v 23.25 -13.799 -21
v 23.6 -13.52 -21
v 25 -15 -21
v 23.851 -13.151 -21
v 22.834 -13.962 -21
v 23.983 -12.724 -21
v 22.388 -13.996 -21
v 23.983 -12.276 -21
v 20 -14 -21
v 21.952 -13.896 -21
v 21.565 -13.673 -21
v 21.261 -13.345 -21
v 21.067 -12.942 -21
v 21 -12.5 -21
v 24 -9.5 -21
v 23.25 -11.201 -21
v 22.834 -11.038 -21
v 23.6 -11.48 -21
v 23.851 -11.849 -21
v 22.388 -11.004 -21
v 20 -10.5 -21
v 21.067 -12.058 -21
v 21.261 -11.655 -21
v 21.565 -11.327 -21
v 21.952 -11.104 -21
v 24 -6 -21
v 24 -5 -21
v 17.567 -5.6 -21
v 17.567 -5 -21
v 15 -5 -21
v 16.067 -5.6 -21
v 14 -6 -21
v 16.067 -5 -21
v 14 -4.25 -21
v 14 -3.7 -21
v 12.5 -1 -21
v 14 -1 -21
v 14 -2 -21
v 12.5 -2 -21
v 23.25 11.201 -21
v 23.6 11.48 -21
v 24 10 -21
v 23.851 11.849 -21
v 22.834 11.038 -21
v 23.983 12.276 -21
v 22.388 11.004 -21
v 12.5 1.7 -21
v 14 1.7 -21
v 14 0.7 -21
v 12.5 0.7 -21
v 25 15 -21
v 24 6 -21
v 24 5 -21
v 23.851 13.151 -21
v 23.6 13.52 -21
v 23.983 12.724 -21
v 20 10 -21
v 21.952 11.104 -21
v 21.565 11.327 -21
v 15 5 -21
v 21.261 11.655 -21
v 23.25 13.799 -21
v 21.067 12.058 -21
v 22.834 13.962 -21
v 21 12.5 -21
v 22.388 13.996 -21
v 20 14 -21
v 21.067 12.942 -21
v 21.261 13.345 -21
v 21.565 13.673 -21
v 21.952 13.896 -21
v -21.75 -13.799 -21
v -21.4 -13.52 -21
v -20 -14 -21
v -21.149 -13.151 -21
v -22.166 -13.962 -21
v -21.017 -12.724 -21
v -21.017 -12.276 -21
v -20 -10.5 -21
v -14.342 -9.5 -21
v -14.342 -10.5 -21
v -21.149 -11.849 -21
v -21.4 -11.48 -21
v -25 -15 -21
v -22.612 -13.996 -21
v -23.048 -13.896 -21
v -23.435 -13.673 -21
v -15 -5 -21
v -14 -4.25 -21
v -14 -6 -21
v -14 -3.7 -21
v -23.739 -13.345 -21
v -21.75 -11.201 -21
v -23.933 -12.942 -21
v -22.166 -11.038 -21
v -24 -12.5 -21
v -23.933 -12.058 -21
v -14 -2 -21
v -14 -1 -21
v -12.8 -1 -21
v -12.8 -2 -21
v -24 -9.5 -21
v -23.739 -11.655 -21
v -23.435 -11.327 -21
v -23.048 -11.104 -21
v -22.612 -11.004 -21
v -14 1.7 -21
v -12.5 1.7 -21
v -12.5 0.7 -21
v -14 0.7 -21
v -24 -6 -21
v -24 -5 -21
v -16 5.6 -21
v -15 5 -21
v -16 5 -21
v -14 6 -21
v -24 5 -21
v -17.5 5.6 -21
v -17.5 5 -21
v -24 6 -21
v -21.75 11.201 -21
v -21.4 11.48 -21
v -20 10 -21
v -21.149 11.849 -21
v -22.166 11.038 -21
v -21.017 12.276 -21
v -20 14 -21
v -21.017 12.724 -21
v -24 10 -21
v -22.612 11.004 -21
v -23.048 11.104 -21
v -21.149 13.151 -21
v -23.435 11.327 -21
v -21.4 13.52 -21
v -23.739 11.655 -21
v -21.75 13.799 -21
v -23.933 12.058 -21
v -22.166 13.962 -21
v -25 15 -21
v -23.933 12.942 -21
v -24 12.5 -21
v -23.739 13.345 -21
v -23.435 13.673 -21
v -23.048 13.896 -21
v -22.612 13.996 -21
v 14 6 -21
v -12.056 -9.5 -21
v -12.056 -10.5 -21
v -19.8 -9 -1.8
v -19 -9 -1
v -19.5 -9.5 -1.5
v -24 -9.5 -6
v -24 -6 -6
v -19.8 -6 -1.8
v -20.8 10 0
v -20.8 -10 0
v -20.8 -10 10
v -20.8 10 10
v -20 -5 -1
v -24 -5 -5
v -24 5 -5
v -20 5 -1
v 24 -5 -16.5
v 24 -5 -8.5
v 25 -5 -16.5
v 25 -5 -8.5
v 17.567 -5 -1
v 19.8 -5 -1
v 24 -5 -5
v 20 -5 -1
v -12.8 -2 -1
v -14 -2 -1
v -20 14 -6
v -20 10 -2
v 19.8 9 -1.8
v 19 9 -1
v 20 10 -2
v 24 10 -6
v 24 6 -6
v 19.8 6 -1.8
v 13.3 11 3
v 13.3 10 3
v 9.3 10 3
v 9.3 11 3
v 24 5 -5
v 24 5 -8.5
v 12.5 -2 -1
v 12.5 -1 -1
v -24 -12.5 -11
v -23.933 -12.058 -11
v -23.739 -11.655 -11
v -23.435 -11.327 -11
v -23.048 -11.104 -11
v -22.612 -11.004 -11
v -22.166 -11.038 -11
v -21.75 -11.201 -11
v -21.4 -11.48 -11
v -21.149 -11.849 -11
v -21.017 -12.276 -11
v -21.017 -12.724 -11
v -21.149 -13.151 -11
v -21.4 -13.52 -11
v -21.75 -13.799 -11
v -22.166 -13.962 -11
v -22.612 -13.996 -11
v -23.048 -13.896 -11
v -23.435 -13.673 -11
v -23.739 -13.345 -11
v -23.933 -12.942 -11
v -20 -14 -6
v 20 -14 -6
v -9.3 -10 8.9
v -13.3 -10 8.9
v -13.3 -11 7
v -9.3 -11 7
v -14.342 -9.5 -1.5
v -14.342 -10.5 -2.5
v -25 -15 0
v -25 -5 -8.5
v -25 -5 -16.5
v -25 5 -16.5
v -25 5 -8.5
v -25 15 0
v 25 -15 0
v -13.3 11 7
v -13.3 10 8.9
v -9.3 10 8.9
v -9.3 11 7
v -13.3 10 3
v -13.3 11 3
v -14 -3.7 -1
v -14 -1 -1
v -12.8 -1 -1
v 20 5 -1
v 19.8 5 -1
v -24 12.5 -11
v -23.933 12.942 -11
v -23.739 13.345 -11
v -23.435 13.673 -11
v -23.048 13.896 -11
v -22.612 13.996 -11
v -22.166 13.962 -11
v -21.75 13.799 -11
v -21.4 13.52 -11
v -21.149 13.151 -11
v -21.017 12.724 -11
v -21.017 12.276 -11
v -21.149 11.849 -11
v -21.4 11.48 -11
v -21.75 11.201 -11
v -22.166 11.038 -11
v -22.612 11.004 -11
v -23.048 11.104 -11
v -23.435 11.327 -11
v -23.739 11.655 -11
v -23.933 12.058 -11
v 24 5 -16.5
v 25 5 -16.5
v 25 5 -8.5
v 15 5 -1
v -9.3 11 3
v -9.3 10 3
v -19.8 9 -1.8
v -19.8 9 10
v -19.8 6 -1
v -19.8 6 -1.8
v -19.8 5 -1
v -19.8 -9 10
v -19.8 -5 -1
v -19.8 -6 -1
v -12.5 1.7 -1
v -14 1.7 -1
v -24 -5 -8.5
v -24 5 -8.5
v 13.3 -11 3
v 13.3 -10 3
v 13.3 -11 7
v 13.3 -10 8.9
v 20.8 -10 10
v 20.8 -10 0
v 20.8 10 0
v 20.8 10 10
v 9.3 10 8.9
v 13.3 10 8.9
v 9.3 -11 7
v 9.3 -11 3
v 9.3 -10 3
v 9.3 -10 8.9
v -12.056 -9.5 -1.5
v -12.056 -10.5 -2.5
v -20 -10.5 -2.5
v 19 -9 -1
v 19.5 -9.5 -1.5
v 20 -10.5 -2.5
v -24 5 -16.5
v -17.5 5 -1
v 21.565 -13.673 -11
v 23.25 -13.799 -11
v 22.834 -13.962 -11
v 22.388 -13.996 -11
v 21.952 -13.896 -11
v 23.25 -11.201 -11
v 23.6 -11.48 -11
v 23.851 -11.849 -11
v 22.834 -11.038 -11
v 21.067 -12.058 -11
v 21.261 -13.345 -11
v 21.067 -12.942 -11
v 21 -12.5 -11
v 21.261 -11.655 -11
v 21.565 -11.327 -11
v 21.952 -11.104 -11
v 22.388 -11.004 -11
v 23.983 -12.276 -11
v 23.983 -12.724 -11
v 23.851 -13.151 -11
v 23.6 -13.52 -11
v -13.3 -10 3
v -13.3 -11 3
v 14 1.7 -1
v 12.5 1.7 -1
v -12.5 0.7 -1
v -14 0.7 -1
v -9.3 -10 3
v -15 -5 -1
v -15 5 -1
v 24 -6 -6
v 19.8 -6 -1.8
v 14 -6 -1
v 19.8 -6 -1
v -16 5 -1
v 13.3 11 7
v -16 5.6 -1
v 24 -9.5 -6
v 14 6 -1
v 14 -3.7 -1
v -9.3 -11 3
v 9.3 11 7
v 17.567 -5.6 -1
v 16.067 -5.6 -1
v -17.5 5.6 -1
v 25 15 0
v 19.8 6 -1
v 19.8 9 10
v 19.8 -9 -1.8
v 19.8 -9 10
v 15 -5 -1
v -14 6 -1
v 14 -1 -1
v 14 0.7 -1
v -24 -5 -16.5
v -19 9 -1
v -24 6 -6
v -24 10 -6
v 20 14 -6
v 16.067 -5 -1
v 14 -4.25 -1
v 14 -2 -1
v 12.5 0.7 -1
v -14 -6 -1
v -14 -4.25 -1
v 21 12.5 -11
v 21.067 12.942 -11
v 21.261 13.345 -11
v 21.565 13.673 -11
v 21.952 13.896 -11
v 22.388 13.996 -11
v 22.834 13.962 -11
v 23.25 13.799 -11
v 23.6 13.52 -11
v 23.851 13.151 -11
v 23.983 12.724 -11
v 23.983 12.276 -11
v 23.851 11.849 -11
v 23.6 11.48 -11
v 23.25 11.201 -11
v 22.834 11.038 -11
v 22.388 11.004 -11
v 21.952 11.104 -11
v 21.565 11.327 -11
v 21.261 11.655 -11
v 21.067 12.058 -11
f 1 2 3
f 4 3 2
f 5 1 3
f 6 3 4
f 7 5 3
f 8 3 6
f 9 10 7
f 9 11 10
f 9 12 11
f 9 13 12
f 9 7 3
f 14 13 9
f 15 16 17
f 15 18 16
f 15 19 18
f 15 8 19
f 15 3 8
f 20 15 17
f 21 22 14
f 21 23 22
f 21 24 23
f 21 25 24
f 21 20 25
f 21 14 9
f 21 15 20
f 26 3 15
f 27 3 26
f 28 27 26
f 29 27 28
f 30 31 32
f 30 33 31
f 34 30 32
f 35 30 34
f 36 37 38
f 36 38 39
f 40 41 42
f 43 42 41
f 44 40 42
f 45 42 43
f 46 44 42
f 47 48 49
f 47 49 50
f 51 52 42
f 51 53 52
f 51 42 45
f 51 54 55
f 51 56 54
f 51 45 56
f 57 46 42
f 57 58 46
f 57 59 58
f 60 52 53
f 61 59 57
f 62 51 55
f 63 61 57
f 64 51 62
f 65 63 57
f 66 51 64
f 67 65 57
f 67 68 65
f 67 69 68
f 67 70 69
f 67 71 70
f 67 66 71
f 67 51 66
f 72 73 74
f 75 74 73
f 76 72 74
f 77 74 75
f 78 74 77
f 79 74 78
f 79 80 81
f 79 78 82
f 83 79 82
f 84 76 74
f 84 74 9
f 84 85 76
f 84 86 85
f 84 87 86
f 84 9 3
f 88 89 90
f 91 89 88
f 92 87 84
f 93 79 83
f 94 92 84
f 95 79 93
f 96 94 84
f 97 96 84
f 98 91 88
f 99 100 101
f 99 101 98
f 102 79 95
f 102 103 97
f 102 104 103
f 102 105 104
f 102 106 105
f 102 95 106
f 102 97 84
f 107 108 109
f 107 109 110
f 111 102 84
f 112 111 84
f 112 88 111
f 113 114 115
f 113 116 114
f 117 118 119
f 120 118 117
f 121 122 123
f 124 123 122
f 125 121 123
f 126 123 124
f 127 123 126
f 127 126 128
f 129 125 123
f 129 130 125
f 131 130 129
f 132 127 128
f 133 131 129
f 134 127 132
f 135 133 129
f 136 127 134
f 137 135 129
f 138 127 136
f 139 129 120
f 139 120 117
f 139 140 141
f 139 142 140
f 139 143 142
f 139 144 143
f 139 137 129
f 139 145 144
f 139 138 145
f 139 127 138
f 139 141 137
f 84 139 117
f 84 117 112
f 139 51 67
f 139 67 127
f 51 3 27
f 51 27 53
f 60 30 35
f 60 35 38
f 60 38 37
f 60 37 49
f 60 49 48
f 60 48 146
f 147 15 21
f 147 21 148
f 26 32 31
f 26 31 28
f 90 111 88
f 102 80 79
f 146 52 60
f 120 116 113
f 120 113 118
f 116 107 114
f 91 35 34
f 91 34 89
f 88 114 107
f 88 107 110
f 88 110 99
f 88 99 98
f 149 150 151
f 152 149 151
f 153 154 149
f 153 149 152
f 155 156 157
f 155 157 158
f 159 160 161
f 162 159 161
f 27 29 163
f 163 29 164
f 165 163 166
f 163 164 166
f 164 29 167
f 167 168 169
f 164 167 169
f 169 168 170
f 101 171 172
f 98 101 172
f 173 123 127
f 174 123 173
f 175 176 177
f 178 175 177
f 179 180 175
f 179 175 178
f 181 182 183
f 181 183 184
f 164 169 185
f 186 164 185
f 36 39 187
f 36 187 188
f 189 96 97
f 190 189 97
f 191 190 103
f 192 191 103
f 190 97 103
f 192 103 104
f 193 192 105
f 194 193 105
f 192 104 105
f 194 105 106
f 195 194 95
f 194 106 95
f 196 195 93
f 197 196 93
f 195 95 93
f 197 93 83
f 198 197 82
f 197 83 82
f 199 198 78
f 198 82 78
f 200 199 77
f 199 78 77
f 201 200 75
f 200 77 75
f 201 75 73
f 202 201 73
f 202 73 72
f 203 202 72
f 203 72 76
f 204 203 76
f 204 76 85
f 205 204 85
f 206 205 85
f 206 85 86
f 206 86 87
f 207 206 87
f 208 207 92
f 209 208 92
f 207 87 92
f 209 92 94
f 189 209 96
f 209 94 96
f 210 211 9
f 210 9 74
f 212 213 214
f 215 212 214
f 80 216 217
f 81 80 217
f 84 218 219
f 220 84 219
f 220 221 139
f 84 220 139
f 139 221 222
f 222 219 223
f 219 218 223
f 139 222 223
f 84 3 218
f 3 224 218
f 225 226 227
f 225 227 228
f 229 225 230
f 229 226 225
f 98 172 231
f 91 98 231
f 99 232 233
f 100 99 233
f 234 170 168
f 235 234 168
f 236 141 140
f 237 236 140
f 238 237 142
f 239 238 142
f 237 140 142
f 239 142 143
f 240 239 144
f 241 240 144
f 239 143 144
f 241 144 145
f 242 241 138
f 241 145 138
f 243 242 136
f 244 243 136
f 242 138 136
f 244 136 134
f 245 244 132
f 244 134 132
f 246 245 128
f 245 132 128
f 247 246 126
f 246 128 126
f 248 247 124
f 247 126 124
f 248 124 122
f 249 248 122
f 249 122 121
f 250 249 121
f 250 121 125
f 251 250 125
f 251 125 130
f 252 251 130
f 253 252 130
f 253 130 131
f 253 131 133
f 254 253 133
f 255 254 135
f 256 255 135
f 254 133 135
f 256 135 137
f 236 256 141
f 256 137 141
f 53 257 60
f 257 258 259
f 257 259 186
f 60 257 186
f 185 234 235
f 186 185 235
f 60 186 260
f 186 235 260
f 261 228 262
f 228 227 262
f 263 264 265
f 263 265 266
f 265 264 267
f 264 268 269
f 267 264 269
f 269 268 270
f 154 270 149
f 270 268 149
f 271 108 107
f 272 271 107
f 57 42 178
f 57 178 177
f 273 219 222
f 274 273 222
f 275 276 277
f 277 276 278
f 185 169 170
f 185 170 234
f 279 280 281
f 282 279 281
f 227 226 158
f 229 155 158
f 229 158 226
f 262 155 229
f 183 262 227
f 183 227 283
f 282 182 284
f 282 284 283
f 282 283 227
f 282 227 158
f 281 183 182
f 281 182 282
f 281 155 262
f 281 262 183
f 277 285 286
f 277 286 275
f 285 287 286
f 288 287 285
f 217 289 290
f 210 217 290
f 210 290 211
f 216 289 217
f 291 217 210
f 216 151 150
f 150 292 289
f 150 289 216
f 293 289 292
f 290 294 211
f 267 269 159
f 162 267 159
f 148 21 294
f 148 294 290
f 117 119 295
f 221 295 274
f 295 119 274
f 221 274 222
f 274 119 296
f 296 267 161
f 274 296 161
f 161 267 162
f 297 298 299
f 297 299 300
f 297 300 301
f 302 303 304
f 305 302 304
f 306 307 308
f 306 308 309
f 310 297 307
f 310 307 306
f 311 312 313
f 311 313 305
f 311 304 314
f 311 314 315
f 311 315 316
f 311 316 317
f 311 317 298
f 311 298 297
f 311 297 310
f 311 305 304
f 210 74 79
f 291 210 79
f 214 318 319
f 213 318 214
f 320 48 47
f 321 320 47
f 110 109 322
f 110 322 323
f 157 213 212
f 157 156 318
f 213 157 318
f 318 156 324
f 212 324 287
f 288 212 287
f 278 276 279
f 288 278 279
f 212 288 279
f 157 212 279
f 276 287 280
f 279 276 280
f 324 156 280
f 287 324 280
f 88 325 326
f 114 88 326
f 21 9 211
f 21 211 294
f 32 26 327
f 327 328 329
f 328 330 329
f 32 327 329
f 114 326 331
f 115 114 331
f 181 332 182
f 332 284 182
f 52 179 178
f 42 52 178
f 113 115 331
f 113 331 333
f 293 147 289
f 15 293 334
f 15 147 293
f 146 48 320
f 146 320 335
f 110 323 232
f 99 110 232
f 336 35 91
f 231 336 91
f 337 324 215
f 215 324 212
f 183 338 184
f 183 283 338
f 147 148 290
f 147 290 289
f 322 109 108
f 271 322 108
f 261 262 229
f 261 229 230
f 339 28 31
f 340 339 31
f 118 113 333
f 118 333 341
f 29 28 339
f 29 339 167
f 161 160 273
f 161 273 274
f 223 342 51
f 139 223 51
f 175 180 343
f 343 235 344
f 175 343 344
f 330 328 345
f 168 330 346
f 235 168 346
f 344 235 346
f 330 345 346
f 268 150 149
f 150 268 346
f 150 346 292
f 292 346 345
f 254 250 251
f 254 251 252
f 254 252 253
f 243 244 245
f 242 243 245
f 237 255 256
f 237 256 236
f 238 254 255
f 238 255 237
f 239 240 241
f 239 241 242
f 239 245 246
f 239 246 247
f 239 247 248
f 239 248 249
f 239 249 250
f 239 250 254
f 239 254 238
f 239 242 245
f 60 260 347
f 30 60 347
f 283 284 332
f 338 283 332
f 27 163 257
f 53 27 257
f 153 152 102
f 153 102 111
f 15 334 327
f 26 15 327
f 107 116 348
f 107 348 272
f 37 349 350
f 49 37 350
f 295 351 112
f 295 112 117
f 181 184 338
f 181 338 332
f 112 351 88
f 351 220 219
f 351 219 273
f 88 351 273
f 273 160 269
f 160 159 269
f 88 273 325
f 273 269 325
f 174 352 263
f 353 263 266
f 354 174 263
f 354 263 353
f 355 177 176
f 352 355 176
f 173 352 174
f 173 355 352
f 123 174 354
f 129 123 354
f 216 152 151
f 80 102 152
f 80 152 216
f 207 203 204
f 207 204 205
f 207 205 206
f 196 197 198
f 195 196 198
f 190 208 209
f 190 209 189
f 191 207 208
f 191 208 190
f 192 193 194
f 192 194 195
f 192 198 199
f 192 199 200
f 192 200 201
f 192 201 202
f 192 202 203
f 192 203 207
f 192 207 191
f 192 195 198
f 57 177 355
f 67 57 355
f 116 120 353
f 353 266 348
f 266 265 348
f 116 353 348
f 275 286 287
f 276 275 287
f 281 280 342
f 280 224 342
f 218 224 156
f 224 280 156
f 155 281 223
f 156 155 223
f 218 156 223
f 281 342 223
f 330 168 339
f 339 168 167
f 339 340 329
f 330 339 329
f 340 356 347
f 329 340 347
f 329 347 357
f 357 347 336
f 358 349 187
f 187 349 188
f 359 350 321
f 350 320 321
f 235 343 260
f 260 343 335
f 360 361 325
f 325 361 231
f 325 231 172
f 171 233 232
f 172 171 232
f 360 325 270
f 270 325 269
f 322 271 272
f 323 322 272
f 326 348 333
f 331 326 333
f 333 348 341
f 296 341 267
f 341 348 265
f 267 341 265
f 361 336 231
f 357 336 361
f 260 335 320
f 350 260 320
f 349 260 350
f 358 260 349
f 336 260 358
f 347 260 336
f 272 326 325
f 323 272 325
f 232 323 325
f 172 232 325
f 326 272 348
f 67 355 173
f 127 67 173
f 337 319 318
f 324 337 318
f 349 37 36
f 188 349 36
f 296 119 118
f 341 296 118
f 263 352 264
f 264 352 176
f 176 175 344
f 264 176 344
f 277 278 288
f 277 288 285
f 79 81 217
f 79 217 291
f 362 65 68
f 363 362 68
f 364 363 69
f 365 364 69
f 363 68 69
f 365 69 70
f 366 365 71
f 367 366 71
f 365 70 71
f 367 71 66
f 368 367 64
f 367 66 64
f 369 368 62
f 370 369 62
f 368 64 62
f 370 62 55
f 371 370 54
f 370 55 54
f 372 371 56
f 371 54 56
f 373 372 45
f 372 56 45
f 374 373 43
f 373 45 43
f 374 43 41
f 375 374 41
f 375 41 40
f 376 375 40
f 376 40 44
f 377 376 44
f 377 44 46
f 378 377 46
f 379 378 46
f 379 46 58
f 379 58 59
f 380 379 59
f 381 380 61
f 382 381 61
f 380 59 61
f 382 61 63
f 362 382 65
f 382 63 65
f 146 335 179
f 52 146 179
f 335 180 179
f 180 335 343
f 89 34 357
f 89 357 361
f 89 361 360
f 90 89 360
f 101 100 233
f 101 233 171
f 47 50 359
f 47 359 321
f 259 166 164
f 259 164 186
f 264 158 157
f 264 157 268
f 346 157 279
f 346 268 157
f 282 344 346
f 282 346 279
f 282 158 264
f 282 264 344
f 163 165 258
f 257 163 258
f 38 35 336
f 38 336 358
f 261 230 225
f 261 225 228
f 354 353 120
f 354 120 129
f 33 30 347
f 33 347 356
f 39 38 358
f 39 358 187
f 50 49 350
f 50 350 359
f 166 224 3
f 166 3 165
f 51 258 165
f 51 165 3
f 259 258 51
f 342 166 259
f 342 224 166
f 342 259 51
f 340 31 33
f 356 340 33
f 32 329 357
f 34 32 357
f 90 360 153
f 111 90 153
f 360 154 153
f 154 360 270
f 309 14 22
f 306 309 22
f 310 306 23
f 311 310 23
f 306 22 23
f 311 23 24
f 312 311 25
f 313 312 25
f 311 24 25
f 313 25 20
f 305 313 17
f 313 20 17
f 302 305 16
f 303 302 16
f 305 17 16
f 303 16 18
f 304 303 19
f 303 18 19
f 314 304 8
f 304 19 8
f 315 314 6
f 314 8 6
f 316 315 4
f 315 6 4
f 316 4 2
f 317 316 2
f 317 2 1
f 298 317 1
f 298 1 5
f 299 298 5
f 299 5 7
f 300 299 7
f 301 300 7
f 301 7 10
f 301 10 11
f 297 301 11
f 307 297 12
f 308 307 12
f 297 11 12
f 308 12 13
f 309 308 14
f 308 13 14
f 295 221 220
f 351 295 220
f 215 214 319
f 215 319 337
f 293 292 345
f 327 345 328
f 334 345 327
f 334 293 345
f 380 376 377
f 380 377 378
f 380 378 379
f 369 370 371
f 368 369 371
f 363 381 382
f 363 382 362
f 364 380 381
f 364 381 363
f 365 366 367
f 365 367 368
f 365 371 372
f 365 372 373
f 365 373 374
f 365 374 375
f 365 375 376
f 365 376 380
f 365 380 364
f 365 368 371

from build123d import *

# Parameters (mm, degrees)
SKETCH1_W            = 41.6
SKETCH1_H            = 20
SKETCH1_W_2          = 39.6
SKETCH1_H_2          = 18
BOSS_EXTRUDE2_DEPTH  = 10
SKETCH2_W            = 4
SKETCH2_H            = 10
BOSS_EXTRUDE3_DEPTH  = 1
SKETCH3_W            = 3
SKETCH3_H            = 1
CUT_EXTRUDE1_DEPTH   = 27
SKETCH4_W            = 4
SKETCH4_H            = 10
BOSS_EXTRUDE4_DEPTH  = 1
SKETCH5_W            = 3
SKETCH5_H            = 1
CUT_EXTRUDE2_DEPTH   = 27
SKETCH6_W            = 50
SKETCH6_H            = 30
SKETCH6_W_2          = 41.6
SKETCH6_H_2          = 20
SKETCH6_W_3          = 39.6
SKETCH6_H_3          = 18
BOSS_EXTRUDE6_DEPTH  = 1
SKETCH7_W            = 50
SKETCH7_H            = 30
SKETCH7_W_2          = 48
SKETCH7_H_2          = 28
BOSS_EXTRUDE7_DEPTH  = 20
SKETCH8_W            = 4.2
SKETCH8_H            = 1
BOSS_EXTRUDE8_DEPTH  = 20
SKETCH9_W            = 4.2
SKETCH9_H            = 1
BOSS_EXTRUDE9_DEPTH  = 20
SKETCH10_W           = 4
SKETCH10_H           = 4
BOSS_EXTRUDE10_DEPTH = 20
SKETCH11_W           = 2
SKETCH11_H           = 10
CUT_EXTRUDE3_DEPTH   = 1
SKETCH12_W           = 2
SKETCH12_H           = 10
CUT_EXTRUDE4_DEPTH   = 1
SKETCH13_R           = 1.5
CUT_EXTRUDE5_DEPTH   = 10
CHAMFER2_SIZE        = 5
CHAMFER3_SIZE        = 5
CHAMFER4_SIZE        = 4
SKETCH16_W           = 1.2
SKETCH16_H           = 1
BOSS_EXTRUDE11_DEPTH = 20
BOSS_EXTRUDE12_DEPTH = 20
SKETCH18_W           = 28
SKETCH18_H           = 0.549749779
BOSS_EXTRUDE13_DEPTH = 20
SKETCH19_W           = 1.2
SKETCH19_H           = 1
CUT_EXTRUDE6_DEPTH   = 20
SKETCH20_W           = 1.5
SKETCH20_H           = 1
BOSS_EXTRUDE14_DEPTH = 20
SKETCH22_W           = 0.3
SKETCH22_H           = 1
BOSS_EXTRUDE16_DEPTH = 20
SKETCH24_W           = 1.2
SKETCH24_H           = 1
CUT_EXTRUDE7_DEPTH   = 20
SKETCH25_W           = 1.5
SKETCH25_H           = 1
BOSS_EXTRUDE17_DEPTH = 20
SKETCH26_W           = 1.5
SKETCH26_H           = 0.6
CUT_EXTRUDE8_DEPTH   = 20
SKETCH27_W           = 1.5
SKETCH27_H           = 0.6
CUT_EXTRUDE9_DEPTH   = 20


# Some blends are built 0.0001 mm under size
with BuildPart() as part:
    # Sketch1 → Boss-Extrude2 (new body)
    with BuildSketch(Plane.XY):
        Rectangle(SKETCH1_W, SKETCH1_H)
        Rectangle(SKETCH1_W_2, SKETCH1_H_2, mode=Mode.SUBTRACT)
    extrude(amount=BOSS_EXTRUDE2_DEPTH)

    # Sketch2 → Boss-Extrude3 (add)
    with BuildSketch(Plane.XZ.offset(10)):
        with Locations((-11.3, 5)):
            Rectangle(SKETCH2_W, SKETCH2_H)
        with Locations((11.3, 5)):
            Rectangle(SKETCH2_W, SKETCH2_H)
    extrude(amount=BOSS_EXTRUDE3_DEPTH)

    # Sketch3 → Cut-Extrude1 (cut)
    with BuildSketch(Plane.ZY.offset(13.3)):
        Polygon((8.900149248, -10), (7, -11), (10, -11), (10, -10), align=None)
        with Locations((1.5, -10.5)):
            Rectangle(SKETCH3_W, SKETCH3_H)
    extrude(amount=-CUT_EXTRUDE1_DEPTH, mode=Mode.SUBTRACT)

    # Sketch4 → Boss-Extrude4 (add)
    with BuildSketch(Plane(origin=(0, 10, 0), x_dir=(1, 0, 0), z_dir=(0, 1, 0))):
        with Locations((11.3, -5)):
            Rectangle(SKETCH4_W, SKETCH4_H)
        with Locations((-11.3, -5)):
            Rectangle(SKETCH4_W, SKETCH4_H)
    extrude(amount=BOSS_EXTRUDE4_DEPTH)

    # Sketch5 → Cut-Extrude2 (cut)
    with BuildSketch(Plane(origin=(13.3, 0, 0), x_dir=(0, 0, -1), z_dir=(1, 0, 0))):
        Polygon((-7, 11), (-10, 11), (-10, 10), (-8.900149248, 10), align=None)
        with Locations((-1.5, 10.5)):
            Rectangle(SKETCH5_W, SKETCH5_H)
    extrude(amount=-CUT_EXTRUDE2_DEPTH, mode=Mode.SUBTRACT)

    # Sketch6 → Boss-Extrude6 (add)
    # profile 1 of 2: a face of its own
    with BuildSketch(Plane(origin=(0, 0, 0), x_dir=(-1, 0, 0), z_dir=(0, 0, -1))):
        Rectangle(SKETCH6_W, SKETCH6_H)
        Rectangle(SKETCH6_W_2, SKETCH6_H_2, mode=Mode.SUBTRACT)
    # profile 2 of 2: a face of its own
    with BuildSketch(Plane(origin=(0, 0, 0), x_dir=(-1, 0, 0), z_dir=(0, 0, -1))):
        Rectangle(SKETCH6_W_2, SKETCH6_H_2)
        Rectangle(SKETCH6_W_3, SKETCH6_H_3, mode=Mode.SUBTRACT)
    extrude(amount=BOSS_EXTRUDE6_DEPTH)

    # Sketch7 → Boss-Extrude7 (add)
    with BuildSketch(Plane(origin=(0, 0, -1), x_dir=(-1, 0, 0), z_dir=(0, 0, -1))):
        Rectangle(SKETCH7_W, SKETCH7_H)
        Rectangle(SKETCH7_W_2, SKETCH7_H_2, mode=Mode.SUBTRACT)
    extrude(amount=BOSS_EXTRUDE7_DEPTH)

    # Sketch8 → Boss-Extrude8 (add)
    with BuildSketch(Plane(origin=(0, 0, -1), x_dir=(-1, 0, 0), z_dir=(0, 0, -1))):
        Polygon((-15, -5), (-19.8, -5), (-19.8, -6), (-14, -6), (-14, 6), (-19.8, 6), (-19.8, 5), (-15, 5), align=None)
        with Locations((-21.9, 5.5)):
            Rectangle(SKETCH8_W, SKETCH8_H)
        with Locations((-21.9, -5.5)):
            Rectangle(SKETCH8_W, SKETCH8_H)
    extrude(amount=BOSS_EXTRUDE8_DEPTH)

    # Sketch9 → Boss-Extrude9 (add)
    with BuildSketch(Plane(origin=(0, 0, -1), x_dir=(-1, 0, 0), z_dir=(0, 0, -1))):
        Polygon((15, 5), (19.8, 5), (19.8, 6), (14, 6), (14, -6), (19.8, -6), (19.8, -5), (15, -5), align=None)
        with Locations((21.9, 5.5)):
            Rectangle(SKETCH9_W, SKETCH9_H)
        with Locations((21.9, -5.5)):
            Rectangle(SKETCH9_W, SKETCH9_H)
    extrude(amount=BOSS_EXTRUDE9_DEPTH)

    # Sketch10 → Boss-Extrude10 (add)
    with BuildSketch(Plane(origin=(0, 0, -1), x_dir=(-1, 0, 0), z_dir=(0, 0, -1))):
        with Locations((-22, 12)):
            Rectangle(SKETCH10_W, SKETCH10_H)
        with Locations((22, 12)):
            Rectangle(SKETCH10_W, SKETCH10_H)
        with Locations((22, -12)):
            Rectangle(SKETCH10_W, SKETCH10_H)
        with Locations((-22, -12)):
            Rectangle(SKETCH10_W, SKETCH10_H)
    extrude(amount=BOSS_EXTRUDE10_DEPTH)

    # Sketch11 → Cut-Extrude3 (cut)
    with BuildSketch(Plane.ZY.offset(25)):
        Polygon((-10.5, -5), (-10.5, 5), (-16.5, 5), (-16.5, 0), (-16.5, -5), align=None)
        with Locations((-9.5, 0)):
            Rectangle(SKETCH11_W, SKETCH11_H)
    extrude(amount=-CUT_EXTRUDE3_DEPTH, mode=Mode.SUBTRACT)

    # Sketch12 → Cut-Extrude4 (cut)
    with BuildSketch(Plane(origin=(25, 0, 0), x_dir=(0, 0, -1), z_dir=(1, 0, 0))):
        with Locations((9.5, 0)):
            Rectangle(SKETCH12_W, SKETCH12_H)
        Polygon((16.5, 5), (10.5, 5), (10.5, -5), (16.5, -5), (16.5, 0), align=None)
    extrude(amount=-CUT_EXTRUDE4_DEPTH, mode=Mode.SUBTRACT)

    # Sketch13 → Cut-Extrude5 (cut)
    with BuildSketch(Plane(origin=(0, 0, -21), x_dir=(-1, 0, 0), z_dir=(0, 0, -1))):
        with Locations((-22.5, 12.5)):
            Circle(SKETCH13_R)
        with Locations((22.5, 12.5)):
            Circle(SKETCH13_R)
        with Locations((22.5, -12.5)):
            Circle(SKETCH13_R)
        with Locations((-22.5, -12.5)):
            Circle(SKETCH13_R)
    extrude(amount=-CUT_EXTRUDE5_DEPTH, mode=Mode.SUBTRACT)

    # Chamfer2
    chamfer2_edges = [part.edges().sort_by_distance(p)[0] for p in [
        (0, 14, -1),
        (0, -14, -1),
    ]]
    chamfer(chamfer2_edges, length=CHAMFER2_SIZE - 0.0001)  # a hair under: the kernel refuses the full size

    # Chamfer3
    # the kernel refuses this chamfer: 5 mm, written as the material it adds along each edge
    with BuildSketch(Plane(origin=(24, -21.85851494, -1), x_dir=(-0.9996219169112968, 0, 0.02749587661058636), z_dir=(0, 1, 0))) as chamfer3_piece_1_section:
        Polygon((CHAMFER3_SIZE * 0.999621916911, -CHAMFER3_SIZE * 0.0274958766106), (-CHAMFER3_SIZE * 0.0274958766106, -CHAMFER3_SIZE * 0.999621916911), (0, 0), align=None)
    chamfer3_piece_1 = extrude(amount=28.71692988, mode=Mode.PRIVATE)
    chamfer3_piece_1 = split(chamfer3_piece_1, bisect_by=Plane(origin=(19.8, -10.000025, -1.99995), z_dir=(1, 0, 0)), keep=Keep.TOP, mode=Mode.PRIVATE)
    chamfer3_piece_1 = split(chamfer3_piece_1, bisect_by=Plane(origin=(19.999975, -5, -1.99995), z_dir=(0, -1, 0)), keep=Keep.TOP, mode=Mode.PRIVATE)
    chamfer3_piece_1 = split(chamfer3_piece_1, bisect_by=Plane(origin=(19.999975, -10.0000375, -1.9999375), z_dir=(0, 0.7071067811865476, -0.7071067811865476)), keep=Keep.TOP, mode=Mode.PRIVATE)
    add(chamfer3_piece_1)
    with BuildSketch(Plane(origin=(24, -21.85851494, -1), x_dir=(-0.9996219169112968, 0, 0.02749587661058636), z_dir=(0, 1, 0))) as chamfer3_piece_2_section:
        Polygon((CHAMFER3_SIZE * 0.999621916911, -CHAMFER3_SIZE * 0.0274958766106), (-CHAMFER3_SIZE * 0.0274958766106, -CHAMFER3_SIZE * 0.999621916911), (0, 0), align=None)
    chamfer3_piece_2 = extrude(amount=28.71692988, mode=Mode.PRIVATE)
    chamfer3_piece_2 = split(chamfer3_piece_2, bisect_by=Plane(origin=(19.599975009, -9, -1.399950019), z_dir=(0, -1, 0)), keep=Keep.TOP, mode=Mode.PRIVATE)
    chamfer3_piece_2 = split(chamfer3_piece_2, bisect_by=Plane(origin=(19.599975009, -9.300037514, -1.299937514), z_dir=(0, 0.7071067811865476, -0.7071067811865476)), keep=Keep.TOP, mode=Mode.PRIVATE)
    add(chamfer3_piece_2)
    with BuildSketch(Plane(origin=(24, -21.85851494, -1), x_dir=(-0.9996219169112968, 0, 0.02749587661058636), z_dir=(0, 1, 0))) as chamfer3_piece_3_section:
        Polygon((CHAMFER3_SIZE * 0.999621916911, -CHAMFER3_SIZE * 0.0274958766106), (-CHAMFER3_SIZE * 0.0274958766106, -CHAMFER3_SIZE * 0.999621916911), (0, 0), align=None)
    chamfer3_piece_3 = extrude(amount=28.71692988, mode=Mode.PRIVATE)
    chamfer3_piece_3 = split(chamfer3_piece_3, bisect_by=Plane(origin=(19.8, 6.42920747, -1.451851852), z_dir=(1, 0, 0)), keep=Keep.TOP, mode=Mode.PRIVATE)
    chamfer3_piece_3 = split(chamfer3_piece_3, bisect_by=Plane(origin=(19.903703704, 5, -1.451851852), z_dir=(0, 1, 0)), keep=Keep.TOP, mode=Mode.PRIVATE)
    add(chamfer3_piece_3)
    with BuildSketch(Plane(origin=(-24, 21.85851494, -1), x_dir=(0.9996219169112968, 0, 0.02749587661058636), z_dir=(0, -1, 0))) as chamfer3_piece_4_section:
        Polygon((CHAMFER3_SIZE * 0.999621916911, -CHAMFER3_SIZE * 0.0274958766106), (-CHAMFER3_SIZE * 0.0274958766106, -CHAMFER3_SIZE * 0.999621916911), (0, 0), align=None)
    chamfer3_piece_4 = extrude(amount=28.71692988, mode=Mode.PRIVATE)
    chamfer3_piece_4 = split(chamfer3_piece_4, bisect_by=Plane(origin=(-19.8, 10.000025, -1.99995), z_dir=(-1, 0, 0)), keep=Keep.TOP, mode=Mode.PRIVATE)
    chamfer3_piece_4 = split(chamfer3_piece_4, bisect_by=Plane(origin=(-19.999975, 15, -1.99995), z_dir=(0, -1, 0)), keep=Keep.TOP, mode=Mode.PRIVATE)
    chamfer3_piece_4 = split(chamfer3_piece_4, bisect_by=Plane(origin=(-19.999975, 5, -1.99995), z_dir=(0, 1, 0)), keep=Keep.TOP, mode=Mode.PRIVATE)
    add(chamfer3_piece_4)
    with BuildSketch(Plane(origin=(-24, 21.85851494, -1), x_dir=(0.9996219169112968, 0, 0.02749587661058636), z_dir=(0, -1, 0))) as chamfer3_piece_5_section:
        Polygon((CHAMFER3_SIZE * 0.999621916911, -CHAMFER3_SIZE * 0.0274958766106), (-CHAMFER3_SIZE * 0.0274958766106, -CHAMFER3_SIZE * 0.999621916911), (0, 0), align=None)
    chamfer3_piece_5 = extrude(amount=28.71692988, mode=Mode.PRIVATE)
    chamfer3_piece_5 = split(chamfer3_piece_5, bisect_by=Plane(origin=(-19.599975009, 9, -1.399950019), z_dir=(0, 1, 0)), keep=Keep.TOP, mode=Mode.PRIVATE)
    chamfer3_piece_5 = split(chamfer3_piece_5, bisect_by=Plane(origin=(-19.599975009, 15, -1.399950019), z_dir=(0, -1, 0)), keep=Keep.TOP, mode=Mode.PRIVATE)
    add(chamfer3_piece_5)
    with BuildSketch(Plane(origin=(-24, 21.85851494, -1), x_dir=(0.9996219169112968, 0, 0.02749587661058636), z_dir=(0, -1, 0))) as chamfer3_piece_6_section:
        Polygon((CHAMFER3_SIZE * 0.999621916911, -CHAMFER3_SIZE * 0.0274958766106), (-CHAMFER3_SIZE * 0.0274958766106, -CHAMFER3_SIZE * 0.999621916911), (0, 0), align=None)
    chamfer3_piece_6 = extrude(amount=28.71692988, mode=Mode.PRIVATE)
    chamfer3_piece_6 = split(chamfer3_piece_6, bisect_by=Plane(origin=(-19.8, -6.42920747, -1.451851852), z_dir=(-1, 0, 0)), keep=Keep.TOP, mode=Mode.PRIVATE)
    chamfer3_piece_6 = split(chamfer3_piece_6, bisect_by=Plane(origin=(-19.903703704, -6, -1.451851852), z_dir=(0, -1, 0)), keep=Keep.TOP, mode=Mode.PRIVATE)
    add(chamfer3_piece_6)
    with BuildSketch(Plane(origin=(-24, 6.85841494, -1), x_dir=(0.9996219169112968, 0, 0.02749587661058636), z_dir=(0, -1, 0))) as chamfer3_piece_7_section:
        Polygon((CHAMFER3_SIZE * 0.999621916911, -CHAMFER3_SIZE * 0.0274958766106), (-CHAMFER3_SIZE * 0.0274958766106, -CHAMFER3_SIZE * 0.999621916911), (0, 0), align=None)
    chamfer3_piece_7 = extrude(amount=28.71692988, mode=Mode.PRIVATE)
    chamfer3_piece_7 = split(chamfer3_piece_7, bisect_by=Plane(origin=(-19.8, 6.42920747, -1.451851852), z_dir=(-1, 0, 0)), keep=Keep.TOP, mode=Mode.PRIVATE)
    chamfer3_piece_7 = split(chamfer3_piece_7, bisect_by=Plane(origin=(-19.903703704, 5, -1.451851852), z_dir=(0, 1, 0)), keep=Keep.TOP, mode=Mode.PRIVATE)
    add(chamfer3_piece_7)
    with BuildSketch(Plane(origin=(-24, -6, -1), x_dir=(0.9996219169112968, 0, 0.02749587661058636), z_dir=(0, -1, 0))) as chamfer3_piece_8_section:
        Polygon((CHAMFER3_SIZE * 0.999621916911, -CHAMFER3_SIZE * 0.0274958766106), (-CHAMFER3_SIZE * 0.0274958766106, -CHAMFER3_SIZE * 0.999621916911), (0, 0), align=None)
    chamfer3_piece_8 = extrude(amount=15.85851494, mode=Mode.PRIVATE)
    chamfer3_piece_8 = split(chamfer3_piece_8, bisect_by=Plane(origin=(-19.8, -7.5, -1.451851852), z_dir=(-1, 0, 0)), keep=Keep.TOP, mode=Mode.PRIVATE)
    chamfer3_piece_8 = split(chamfer3_piece_8, bisect_by=Plane(origin=(-19.903703704, -8.475975926, -0.475875926), z_dir=(0, 0.7071067811865476, -0.7071067811865476)), keep=Keep.TOP, mode=Mode.PRIVATE)
    add(chamfer3_piece_8)
    with BuildSketch(Plane(origin=(-24, 6.85841494, -1), x_dir=(0.9996219169112968, 0, 0.02749587661058636), z_dir=(0, -1, 0))) as chamfer3_piece_9_section:
        Polygon((CHAMFER3_SIZE * 0.999621916911, -CHAMFER3_SIZE * 0.0274958766106), (-CHAMFER3_SIZE * 0.0274958766106, -CHAMFER3_SIZE * 0.999621916911), (0, 0), align=None)
    chamfer3_piece_9 = extrude(amount=28.71692988, mode=Mode.PRIVATE)
    chamfer3_piece_9 = split(chamfer3_piece_9, bisect_by=Plane(origin=(-19.599975009, -9, -1.399950019), z_dir=(0, -1, 0)), keep=Keep.TOP, mode=Mode.PRIVATE)
    chamfer3_piece_9 = split(chamfer3_piece_9, bisect_by=Plane(origin=(-19.599975009, -9.300037514, -1.299937514), z_dir=(0, 0.7071067811865476, -0.7071067811865476)), keep=Keep.TOP, mode=Mode.PRIVATE)
    add(chamfer3_piece_9)
    with BuildSketch(Plane(origin=(24, -6.85841494, -1), x_dir=(-0.9996219169112968, 0, 0.02749587661058636), z_dir=(0, 1, 0))) as chamfer3_piece_10_section:
        Polygon((CHAMFER3_SIZE * 0.999621916911, -CHAMFER3_SIZE * 0.0274958766106), (-CHAMFER3_SIZE * 0.0274958766106, -CHAMFER3_SIZE * 0.999621916911), (0, 0), align=None)
    chamfer3_piece_10 = extrude(amount=28.71692988, mode=Mode.PRIVATE)
    chamfer3_piece_10 = split(chamfer3_piece_10, bisect_by=Plane(origin=(19.8, -6.42920747, -1.451851852), z_dir=(1, 0, 0)), keep=Keep.TOP, mode=Mode.PRIVATE)
    chamfer3_piece_10 = split(chamfer3_piece_10, bisect_by=Plane(origin=(19.903703704, -5, -1.451851852), z_dir=(0, -1, 0)), keep=Keep.TOP, mode=Mode.PRIVATE)
    add(chamfer3_piece_10)
    with BuildSketch(Plane(origin=(24, -6.85841494, -1), x_dir=(-0.9996219169112968, 0, 0.02749587661058636), z_dir=(0, 1, 0))) as chamfer3_piece_11_section:
        Polygon((CHAMFER3_SIZE * 0.999621916911, -CHAMFER3_SIZE * 0.0274958766106), (-CHAMFER3_SIZE * 0.0274958766106, -CHAMFER3_SIZE * 0.999621916911), (0, 0), align=None)
    chamfer3_piece_11 = extrude(amount=28.71692988, mode=Mode.PRIVATE)
    chamfer3_piece_11 = split(chamfer3_piece_11, bisect_by=Plane(origin=(19.8, 7.5, -1.451851852), z_dir=(1, 0, 0)), keep=Keep.TOP, mode=Mode.PRIVATE)
    chamfer3_piece_11 = split(chamfer3_piece_11, bisect_by=Plane(origin=(19.903703704, 15, -1.451851852), z_dir=(0, -1, 0)), keep=Keep.TOP, mode=Mode.PRIVATE)
    chamfer3_piece_11 = split(chamfer3_piece_11, bisect_by=Plane(origin=(19.903703704, 5, -1.451851852), z_dir=(0, 1, 0)), keep=Keep.TOP, mode=Mode.PRIVATE)
    add(chamfer3_piece_11)
    with BuildSketch(Plane(origin=(24, -6.85841494, -1), x_dir=(-0.9996219169112968, 0, 0.02749587661058636), z_dir=(0, 1, 0))) as chamfer3_piece_12_section:
        Polygon((CHAMFER3_SIZE * 0.999621916911, -CHAMFER3_SIZE * 0.0274958766106), (-CHAMFER3_SIZE * 0.0274958766106, -CHAMFER3_SIZE * 0.999621916911), (0, 0), align=None)
    chamfer3_piece_12 = extrude(amount=28.71692988, mode=Mode.PRIVATE)
    chamfer3_piece_12 = split(chamfer3_piece_12, bisect_by=Plane(origin=(19.599975009, 9, -1.399950019), z_dir=(0, 1, 0)), keep=Keep.TOP, mode=Mode.PRIVATE)
    chamfer3_piece_12 = split(chamfer3_piece_12, bisect_by=Plane(origin=(19.599975009, 15, -1.399950019), z_dir=(0, -1, 0)), keep=Keep.TOP, mode=Mode.PRIVATE)
    add(chamfer3_piece_12)

    # Chamfer4
    chamfer4_edges = [part.edges().sort_by_distance(p)[0] for p in [
        (24, 0, -1),
        (-24, 0, -1),
    ]]
    chamfer(chamfer4_edges, length=CHAMFER4_SIZE)

    # Sketch16 → Boss-Extrude11 (add)
    with BuildSketch(Plane(origin=(0, 0, -21), x_dir=(-1, 0, 0), z_dir=(0, 0, -1))):
        with Locations((-13.4, 0.5)):
            Rectangle(SKETCH16_W, SKETCH16_H)
        with Locations((-13.4, -1.5)):
            Rectangle(SKETCH16_W, SKETCH16_H)
        with Locations((13.4, 0.5)):
            Rectangle(SKETCH16_W, SKETCH16_H)
        Polygon((13, -1), (12.8, -1), (12.8, -2), (14, -2), (14, -1), align=None)
    extrude(amount=-BOSS_EXTRUDE11_DEPTH)

    # Sketch17 → Boss-Extrude12 (add)
    with BuildSketch(Plane(origin=(0, 0, -21), x_dir=(-1, 0, 0), z_dir=(0, 0, -1))):
        Polygon((-20, -10), (-20, -10.5), (-16.744161901, -10.5), (12.056353702, -10.5), (12.056353702, -9.5), (-24, -9.5), (-24, -10), align=None)
        Polygon((14.342415664, -9.5), (14.342415664, -10.5), (20, -10.5), (20, -10), (24, -10), (24, -9.5), align=None)
    extrude(amount=-BOSS_EXTRUDE12_DEPTH)

    # Sketch18 → Boss-Extrude13 (add)
    with BuildSketch(Plane(origin=(0, 0, -21), x_dir=(-1, 0, 0), z_dir=(0, 0, -1))):
        with Locations((0, -3.97487489)):
            Rectangle(SKETCH18_W, SKETCH18_H)
    extrude(amount=-BOSS_EXTRUDE13_DEPTH)

    # Sketch19 → Cut-Extrude6 (cut)
    with BuildSketch(Plane(origin=(0, 0, -21), x_dir=(-1, 0, 0), z_dir=(0, 0, -1))):
        with Locations((-13.4, 0.5)):
            Rectangle(SKETCH19_W, SKETCH19_H)
    extrude(amount=-CUT_EXTRUDE6_DEPTH, mode=Mode.SUBTRACT)

    # Sketch20 → Boss-Extrude14 (add)
    with BuildSketch(Plane(origin=(0, 0, -21), x_dir=(-1, 0, 0), z_dir=(0, 0, -1))):
        with Locations((-13.25, 1.2)):
            Rectangle(SKETCH20_W, SKETCH20_H)
    extrude(amount=-BOSS_EXTRUDE14_DEPTH)

    # Sketch22 → Boss-Extrude16 (add)
    with BuildSketch(Plane(origin=(0, 0, -21), x_dir=(-1, 0, 0), z_dir=(0, 0, -1))):
        with Locations((-12.65, -1.5)):
            Rectangle(SKETCH22_W, SKETCH22_H)
    extrude(amount=-BOSS_EXTRUDE16_DEPTH)

    # Sketch24 → Cut-Extrude7 (cut)
    with BuildSketch(Plane(origin=(0, 0, -21), x_dir=(-1, 0, 0), z_dir=(0, 0, -1))):
        with Locations((13.4, 0.5)):
            Rectangle(SKETCH24_W, SKETCH24_H)
    extrude(amount=-CUT_EXTRUDE7_DEPTH, mode=Mode.SUBTRACT)

    # Sketch25 → Boss-Extrude17 (add)
    with BuildSketch(Plane(origin=(0, 0, -21), x_dir=(-1, 0, 0), z_dir=(0, 0, -1))):
        with Locations((13.25, 1.2)):
            Rectangle(SKETCH25_W, SKETCH25_H)
    extrude(amount=-BOSS_EXTRUDE17_DEPTH)

    # Sketch26 → Cut-Extrude8 (cut)
    with BuildSketch(Plane(origin=(0, 0, -21), x_dir=(-1, 0, 0), z_dir=(0, 0, -1))):
        with Locations((16.75, 5.3)):
            Rectangle(SKETCH26_W, SKETCH26_H)
    extrude(amount=-CUT_EXTRUDE8_DEPTH, mode=Mode.SUBTRACT)

    # Sketch27 → Cut-Extrude9 (cut)
    with BuildSketch(Plane(origin=(0, 0, -21), x_dir=(-1, 0, 0), z_dir=(0, 0, -1))):
        with Locations((-16.817086242, -5.3)):
            Rectangle(SKETCH27_W, SKETCH27_H)
    extrude(amount=-CUT_EXTRUDE9_DEPTH, mode=Mode.SUBTRACT)


solid = part.part
